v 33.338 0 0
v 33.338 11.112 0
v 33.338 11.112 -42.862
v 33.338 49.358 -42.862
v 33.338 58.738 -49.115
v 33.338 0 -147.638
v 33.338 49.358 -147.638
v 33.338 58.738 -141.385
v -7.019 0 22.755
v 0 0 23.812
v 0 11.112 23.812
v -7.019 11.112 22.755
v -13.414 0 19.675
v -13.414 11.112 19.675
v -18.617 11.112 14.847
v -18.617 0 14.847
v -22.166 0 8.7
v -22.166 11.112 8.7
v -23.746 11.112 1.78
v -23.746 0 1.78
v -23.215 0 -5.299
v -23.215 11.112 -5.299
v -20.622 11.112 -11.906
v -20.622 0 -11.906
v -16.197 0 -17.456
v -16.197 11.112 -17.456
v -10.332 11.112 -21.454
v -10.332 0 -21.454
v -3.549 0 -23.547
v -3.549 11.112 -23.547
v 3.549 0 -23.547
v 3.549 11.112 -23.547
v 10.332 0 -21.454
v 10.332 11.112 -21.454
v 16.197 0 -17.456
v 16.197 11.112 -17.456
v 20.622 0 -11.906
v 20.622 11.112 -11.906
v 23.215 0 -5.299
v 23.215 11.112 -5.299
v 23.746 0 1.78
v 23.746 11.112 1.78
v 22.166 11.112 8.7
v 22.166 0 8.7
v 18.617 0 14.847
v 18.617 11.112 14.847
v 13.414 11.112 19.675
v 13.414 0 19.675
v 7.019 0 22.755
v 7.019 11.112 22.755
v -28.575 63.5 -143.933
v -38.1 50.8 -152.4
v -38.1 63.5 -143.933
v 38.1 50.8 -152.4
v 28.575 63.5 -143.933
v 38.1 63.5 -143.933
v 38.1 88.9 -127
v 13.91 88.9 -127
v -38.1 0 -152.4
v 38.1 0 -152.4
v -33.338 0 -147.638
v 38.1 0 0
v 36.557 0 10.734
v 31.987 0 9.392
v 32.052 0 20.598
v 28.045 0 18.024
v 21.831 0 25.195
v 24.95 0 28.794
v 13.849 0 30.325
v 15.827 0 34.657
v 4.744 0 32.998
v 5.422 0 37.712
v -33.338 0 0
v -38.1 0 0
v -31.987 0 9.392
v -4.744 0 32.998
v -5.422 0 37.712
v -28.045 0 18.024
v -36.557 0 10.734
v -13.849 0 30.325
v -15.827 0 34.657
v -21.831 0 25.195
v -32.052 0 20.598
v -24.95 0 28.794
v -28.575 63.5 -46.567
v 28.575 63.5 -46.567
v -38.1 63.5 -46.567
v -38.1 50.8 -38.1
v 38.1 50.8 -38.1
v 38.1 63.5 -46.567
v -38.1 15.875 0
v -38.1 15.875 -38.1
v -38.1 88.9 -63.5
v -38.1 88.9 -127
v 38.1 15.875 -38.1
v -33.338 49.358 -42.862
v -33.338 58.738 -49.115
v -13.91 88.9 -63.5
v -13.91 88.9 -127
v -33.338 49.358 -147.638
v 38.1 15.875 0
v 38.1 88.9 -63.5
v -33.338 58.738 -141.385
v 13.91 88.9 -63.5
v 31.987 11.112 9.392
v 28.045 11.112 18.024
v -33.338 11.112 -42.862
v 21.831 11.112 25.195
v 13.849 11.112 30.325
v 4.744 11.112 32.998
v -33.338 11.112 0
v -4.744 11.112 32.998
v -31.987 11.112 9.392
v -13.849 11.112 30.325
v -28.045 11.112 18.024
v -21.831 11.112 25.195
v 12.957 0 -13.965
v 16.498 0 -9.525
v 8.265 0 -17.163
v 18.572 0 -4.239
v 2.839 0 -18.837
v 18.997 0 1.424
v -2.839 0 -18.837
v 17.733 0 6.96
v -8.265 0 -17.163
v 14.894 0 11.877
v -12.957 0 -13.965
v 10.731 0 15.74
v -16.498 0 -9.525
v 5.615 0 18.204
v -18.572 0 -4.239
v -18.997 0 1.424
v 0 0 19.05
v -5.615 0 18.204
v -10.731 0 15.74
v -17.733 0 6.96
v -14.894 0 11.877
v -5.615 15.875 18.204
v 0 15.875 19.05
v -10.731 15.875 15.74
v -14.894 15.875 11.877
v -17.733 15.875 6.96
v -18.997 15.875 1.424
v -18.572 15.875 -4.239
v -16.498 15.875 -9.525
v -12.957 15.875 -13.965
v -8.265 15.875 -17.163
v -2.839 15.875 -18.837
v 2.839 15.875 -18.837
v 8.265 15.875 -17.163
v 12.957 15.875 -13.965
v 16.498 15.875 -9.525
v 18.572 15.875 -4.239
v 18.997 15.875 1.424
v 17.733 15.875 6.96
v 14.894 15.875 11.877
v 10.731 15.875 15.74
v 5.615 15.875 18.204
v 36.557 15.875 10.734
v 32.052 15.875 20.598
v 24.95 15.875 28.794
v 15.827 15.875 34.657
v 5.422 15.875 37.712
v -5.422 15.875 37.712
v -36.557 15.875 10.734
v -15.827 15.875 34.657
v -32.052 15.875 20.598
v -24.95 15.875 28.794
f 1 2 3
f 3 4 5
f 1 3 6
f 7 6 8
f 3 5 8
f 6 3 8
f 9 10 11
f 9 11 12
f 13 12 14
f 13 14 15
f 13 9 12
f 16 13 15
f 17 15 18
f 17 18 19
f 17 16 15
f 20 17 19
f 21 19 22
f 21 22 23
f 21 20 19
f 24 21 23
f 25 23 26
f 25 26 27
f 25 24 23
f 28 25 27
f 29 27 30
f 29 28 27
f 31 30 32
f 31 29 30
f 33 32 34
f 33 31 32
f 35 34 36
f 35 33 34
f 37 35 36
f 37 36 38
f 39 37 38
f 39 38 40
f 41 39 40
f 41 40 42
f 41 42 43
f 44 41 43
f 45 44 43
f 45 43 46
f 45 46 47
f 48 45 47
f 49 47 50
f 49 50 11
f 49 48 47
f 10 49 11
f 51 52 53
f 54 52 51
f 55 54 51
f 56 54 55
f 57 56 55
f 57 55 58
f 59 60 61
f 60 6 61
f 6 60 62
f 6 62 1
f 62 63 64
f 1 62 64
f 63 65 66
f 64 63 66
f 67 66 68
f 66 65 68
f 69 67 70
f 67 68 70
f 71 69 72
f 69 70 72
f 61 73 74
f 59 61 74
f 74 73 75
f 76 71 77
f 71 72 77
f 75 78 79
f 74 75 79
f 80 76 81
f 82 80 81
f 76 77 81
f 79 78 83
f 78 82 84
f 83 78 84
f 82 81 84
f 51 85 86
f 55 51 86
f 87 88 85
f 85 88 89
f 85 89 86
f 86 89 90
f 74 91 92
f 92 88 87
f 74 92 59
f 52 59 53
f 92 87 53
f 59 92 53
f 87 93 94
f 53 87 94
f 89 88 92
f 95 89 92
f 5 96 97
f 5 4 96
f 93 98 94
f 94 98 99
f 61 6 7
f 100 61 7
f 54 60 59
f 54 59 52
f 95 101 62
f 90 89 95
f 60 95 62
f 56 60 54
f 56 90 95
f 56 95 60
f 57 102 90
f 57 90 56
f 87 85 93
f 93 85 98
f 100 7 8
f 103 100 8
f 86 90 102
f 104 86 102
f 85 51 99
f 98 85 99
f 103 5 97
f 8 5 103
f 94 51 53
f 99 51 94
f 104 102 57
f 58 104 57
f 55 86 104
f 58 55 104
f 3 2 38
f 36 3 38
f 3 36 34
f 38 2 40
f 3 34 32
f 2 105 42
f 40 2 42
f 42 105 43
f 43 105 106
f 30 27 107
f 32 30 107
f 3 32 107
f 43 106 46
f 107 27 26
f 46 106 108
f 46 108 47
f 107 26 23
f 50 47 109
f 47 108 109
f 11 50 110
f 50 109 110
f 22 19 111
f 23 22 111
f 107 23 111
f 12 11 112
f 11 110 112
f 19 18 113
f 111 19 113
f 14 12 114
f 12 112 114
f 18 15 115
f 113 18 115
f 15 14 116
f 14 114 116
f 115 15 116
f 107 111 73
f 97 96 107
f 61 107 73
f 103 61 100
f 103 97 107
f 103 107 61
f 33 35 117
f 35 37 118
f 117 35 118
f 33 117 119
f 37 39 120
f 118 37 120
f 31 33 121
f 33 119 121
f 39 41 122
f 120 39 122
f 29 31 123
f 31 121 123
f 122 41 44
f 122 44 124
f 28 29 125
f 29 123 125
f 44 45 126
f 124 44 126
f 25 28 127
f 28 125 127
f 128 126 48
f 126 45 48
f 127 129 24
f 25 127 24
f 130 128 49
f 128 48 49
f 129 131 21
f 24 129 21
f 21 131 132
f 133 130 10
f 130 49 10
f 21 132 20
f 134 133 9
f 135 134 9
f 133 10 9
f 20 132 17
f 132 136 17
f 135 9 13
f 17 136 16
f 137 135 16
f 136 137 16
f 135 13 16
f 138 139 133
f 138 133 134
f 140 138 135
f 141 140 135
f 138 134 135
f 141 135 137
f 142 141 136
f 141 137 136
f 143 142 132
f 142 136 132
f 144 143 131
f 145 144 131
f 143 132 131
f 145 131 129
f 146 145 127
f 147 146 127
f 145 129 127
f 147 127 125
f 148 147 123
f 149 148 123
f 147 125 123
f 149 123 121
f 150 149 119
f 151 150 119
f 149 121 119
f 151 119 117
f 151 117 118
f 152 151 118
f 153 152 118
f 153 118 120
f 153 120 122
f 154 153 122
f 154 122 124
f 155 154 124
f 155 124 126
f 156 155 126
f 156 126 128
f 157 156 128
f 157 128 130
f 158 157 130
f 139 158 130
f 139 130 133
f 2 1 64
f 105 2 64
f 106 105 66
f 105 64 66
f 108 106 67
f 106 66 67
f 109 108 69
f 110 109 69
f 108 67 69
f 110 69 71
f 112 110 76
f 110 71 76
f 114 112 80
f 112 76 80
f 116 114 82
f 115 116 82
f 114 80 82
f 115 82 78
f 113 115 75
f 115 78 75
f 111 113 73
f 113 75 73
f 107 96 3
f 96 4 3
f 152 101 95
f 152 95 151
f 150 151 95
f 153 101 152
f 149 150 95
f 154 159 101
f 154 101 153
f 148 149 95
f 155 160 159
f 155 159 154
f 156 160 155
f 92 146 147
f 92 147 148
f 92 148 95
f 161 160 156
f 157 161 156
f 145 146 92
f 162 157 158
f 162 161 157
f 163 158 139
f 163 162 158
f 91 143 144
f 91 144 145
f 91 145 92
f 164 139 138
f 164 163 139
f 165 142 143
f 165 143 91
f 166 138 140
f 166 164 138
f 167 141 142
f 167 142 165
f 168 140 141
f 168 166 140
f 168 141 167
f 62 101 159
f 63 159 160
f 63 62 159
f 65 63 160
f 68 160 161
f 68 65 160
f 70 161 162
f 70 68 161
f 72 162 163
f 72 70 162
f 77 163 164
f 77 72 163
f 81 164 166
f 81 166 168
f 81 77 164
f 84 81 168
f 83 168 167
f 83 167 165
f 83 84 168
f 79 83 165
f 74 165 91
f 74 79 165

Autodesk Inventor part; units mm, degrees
ref_plane "YZ Plane" through (0, 0, 0) normal (1, 0, 0) x (0, 1, 0)
ref_plane "XZ Plane" through (0, 0, 0) normal (0, 1, 0) x (-1, 0, 0)
ref_plane "XY Plane" through (0, 0, 0) normal (0, 0, 1) x (1, 0, 0)
sketch "Sketch1" plane through (0, 0, 0) normal (0, 1, 0) x (-1, 0, 0)
  arc A0 (38.1, 0) -> (-38.1, 0) centre (0, 0) ccw
  line L0 (38.1, 0) -> (38.1, -152.4)
  line L1 (-38.1, 0) -> (-38.1, -152.4)
  line L2 (0, -190.5) -> (0, 76.2) projected
  line L3 (53.34, 0) -> (-53.34, 0) projected
  line L4 (38.1, -152.4) -> (-38.1, -152.4)
  dimension "d0" = 76.2
  dimension "d1" = 152.4
  dimension "d2" = 152.4
extrude "Extrusion1" add sketch "Sketch1" along normal blind 15.875
sketch "Sketch2" plane through (0, 15.875, 0) normal (0, 1, 0) x (1, 0, 0)
  point P0 (0, 0)
  point P1 (0, 0)
hole "Hole1" at (0, 15.875, 0) direction (0, -1, 0) diameter 38.1 depth 15.875 tip angle 118
sketch "Sketch4" plane through (38.1, 0, 0) normal (1, 0, 0) x (0, 0, -1)
  line L0 (152.4, 15.875) -> (0, 15.875) projected
  line L1 (152.4, 15.875) -> (152.4, 50.8)
  line L2 (152.4, 50.8) -> (152.4, 88.9)
  line L3 (152.4, 88.9) -> (38.1, 88.9)
  line L4 (38.1, 88.9) -> (38.1, 15.875)
  line L5 (152.4, 50.8) -> (127, 88.9)
  line L6 (38.1, 50.8) -> (63.5, 88.9)
  line L7 (46.5667, 63.5) -> (143.9333, 63.5)
  point P0 (0, 0)
  dimension "d15" = 114.3
  dimension "d16" = 50.8
  dimension "d17" = 88.9
  dimension "d18" = 25.4
  dimension "d19" = 25.4
extrude "Extrusion2" add sketch "Sketch4" against normal blind 76.2 contours L0 L4 L6 L7 L5 L1
shell "Shell1" thickness 4.7625 removed faces 1 at (0, 0, -107.95)
sketch "Sketch5" plane through (38.1, 0, 0) normal (1, 0, 0) x (0, 0, -1)
  point P0 (0, 0)
sketch "Sketch6" plane through (38.1, 0, 0) normal (1, 0, 0) x (0, 0, -1)
  line L0 (38.1, 50.8) -> (38.1, 15.875) projected
  line L1 (38.1, 50.8) -> (38.1, 88.9)
  line L2 (38.1, 88.9) -> (152.4, 88.9)
  line L3 (152.4, 0) -> (152.4, 50.8) projected
  line L4 (152.4, 88.9) -> (152.4, 50.8)
  line L5 (46.5667, 63.5) -> (38.1, 50.8) projected
  line L6 (46.5667, 63.5) -> (63.5, 88.9)
  line L7 (152.4, 50.8) -> (143.9333, 63.5) projected
  line L8 (143.9333, 63.5) -> (127, 88.9)
  line L9 (46.5667, 63.5) -> (143.9333, 63.5)
  line L10 (0, 0) -> (152.4, 0) projected
  dimension "d23" = 38.1
extrude "Extrusion3" add sketch "Sketch6" against normal blind 76.2 contours L6 L2 L8 L9
sketch "Sketch8" plane through (38.1, 15.875, -38.1) normal (0, 0, 1) x (1, 0, 0)
  line L0 (-66.675, 47.625) -> (-9.525, 47.625)
  line L1 (0, 73.025) -> (-76.2, 73.025) projected
  line L2 (-66.675, 47.625) -> (-52.0103, 73.025)
  line L3 (-9.525, 47.625) -> (-24.1897, 73.025)
  line L4 (-52.0103, 73.025) -> (-24.1897, 73.025)
  point P0 (-38.1, -15.875)
  point P1 (-59.3427, 60.325)
  point P2 (-16.8573, 60.325)
  point P3 (-38.1, 73.025)
  point P4 (-38.1, 47.625)
  dimension "d31" = 57.15
  dimension "d32" = 25.4
  dimension "d33" = 60
extrude "Extrusion4" cut sketch "Sketch8" against normal blind 107.95
properties part number "Ch4 Part 4"
